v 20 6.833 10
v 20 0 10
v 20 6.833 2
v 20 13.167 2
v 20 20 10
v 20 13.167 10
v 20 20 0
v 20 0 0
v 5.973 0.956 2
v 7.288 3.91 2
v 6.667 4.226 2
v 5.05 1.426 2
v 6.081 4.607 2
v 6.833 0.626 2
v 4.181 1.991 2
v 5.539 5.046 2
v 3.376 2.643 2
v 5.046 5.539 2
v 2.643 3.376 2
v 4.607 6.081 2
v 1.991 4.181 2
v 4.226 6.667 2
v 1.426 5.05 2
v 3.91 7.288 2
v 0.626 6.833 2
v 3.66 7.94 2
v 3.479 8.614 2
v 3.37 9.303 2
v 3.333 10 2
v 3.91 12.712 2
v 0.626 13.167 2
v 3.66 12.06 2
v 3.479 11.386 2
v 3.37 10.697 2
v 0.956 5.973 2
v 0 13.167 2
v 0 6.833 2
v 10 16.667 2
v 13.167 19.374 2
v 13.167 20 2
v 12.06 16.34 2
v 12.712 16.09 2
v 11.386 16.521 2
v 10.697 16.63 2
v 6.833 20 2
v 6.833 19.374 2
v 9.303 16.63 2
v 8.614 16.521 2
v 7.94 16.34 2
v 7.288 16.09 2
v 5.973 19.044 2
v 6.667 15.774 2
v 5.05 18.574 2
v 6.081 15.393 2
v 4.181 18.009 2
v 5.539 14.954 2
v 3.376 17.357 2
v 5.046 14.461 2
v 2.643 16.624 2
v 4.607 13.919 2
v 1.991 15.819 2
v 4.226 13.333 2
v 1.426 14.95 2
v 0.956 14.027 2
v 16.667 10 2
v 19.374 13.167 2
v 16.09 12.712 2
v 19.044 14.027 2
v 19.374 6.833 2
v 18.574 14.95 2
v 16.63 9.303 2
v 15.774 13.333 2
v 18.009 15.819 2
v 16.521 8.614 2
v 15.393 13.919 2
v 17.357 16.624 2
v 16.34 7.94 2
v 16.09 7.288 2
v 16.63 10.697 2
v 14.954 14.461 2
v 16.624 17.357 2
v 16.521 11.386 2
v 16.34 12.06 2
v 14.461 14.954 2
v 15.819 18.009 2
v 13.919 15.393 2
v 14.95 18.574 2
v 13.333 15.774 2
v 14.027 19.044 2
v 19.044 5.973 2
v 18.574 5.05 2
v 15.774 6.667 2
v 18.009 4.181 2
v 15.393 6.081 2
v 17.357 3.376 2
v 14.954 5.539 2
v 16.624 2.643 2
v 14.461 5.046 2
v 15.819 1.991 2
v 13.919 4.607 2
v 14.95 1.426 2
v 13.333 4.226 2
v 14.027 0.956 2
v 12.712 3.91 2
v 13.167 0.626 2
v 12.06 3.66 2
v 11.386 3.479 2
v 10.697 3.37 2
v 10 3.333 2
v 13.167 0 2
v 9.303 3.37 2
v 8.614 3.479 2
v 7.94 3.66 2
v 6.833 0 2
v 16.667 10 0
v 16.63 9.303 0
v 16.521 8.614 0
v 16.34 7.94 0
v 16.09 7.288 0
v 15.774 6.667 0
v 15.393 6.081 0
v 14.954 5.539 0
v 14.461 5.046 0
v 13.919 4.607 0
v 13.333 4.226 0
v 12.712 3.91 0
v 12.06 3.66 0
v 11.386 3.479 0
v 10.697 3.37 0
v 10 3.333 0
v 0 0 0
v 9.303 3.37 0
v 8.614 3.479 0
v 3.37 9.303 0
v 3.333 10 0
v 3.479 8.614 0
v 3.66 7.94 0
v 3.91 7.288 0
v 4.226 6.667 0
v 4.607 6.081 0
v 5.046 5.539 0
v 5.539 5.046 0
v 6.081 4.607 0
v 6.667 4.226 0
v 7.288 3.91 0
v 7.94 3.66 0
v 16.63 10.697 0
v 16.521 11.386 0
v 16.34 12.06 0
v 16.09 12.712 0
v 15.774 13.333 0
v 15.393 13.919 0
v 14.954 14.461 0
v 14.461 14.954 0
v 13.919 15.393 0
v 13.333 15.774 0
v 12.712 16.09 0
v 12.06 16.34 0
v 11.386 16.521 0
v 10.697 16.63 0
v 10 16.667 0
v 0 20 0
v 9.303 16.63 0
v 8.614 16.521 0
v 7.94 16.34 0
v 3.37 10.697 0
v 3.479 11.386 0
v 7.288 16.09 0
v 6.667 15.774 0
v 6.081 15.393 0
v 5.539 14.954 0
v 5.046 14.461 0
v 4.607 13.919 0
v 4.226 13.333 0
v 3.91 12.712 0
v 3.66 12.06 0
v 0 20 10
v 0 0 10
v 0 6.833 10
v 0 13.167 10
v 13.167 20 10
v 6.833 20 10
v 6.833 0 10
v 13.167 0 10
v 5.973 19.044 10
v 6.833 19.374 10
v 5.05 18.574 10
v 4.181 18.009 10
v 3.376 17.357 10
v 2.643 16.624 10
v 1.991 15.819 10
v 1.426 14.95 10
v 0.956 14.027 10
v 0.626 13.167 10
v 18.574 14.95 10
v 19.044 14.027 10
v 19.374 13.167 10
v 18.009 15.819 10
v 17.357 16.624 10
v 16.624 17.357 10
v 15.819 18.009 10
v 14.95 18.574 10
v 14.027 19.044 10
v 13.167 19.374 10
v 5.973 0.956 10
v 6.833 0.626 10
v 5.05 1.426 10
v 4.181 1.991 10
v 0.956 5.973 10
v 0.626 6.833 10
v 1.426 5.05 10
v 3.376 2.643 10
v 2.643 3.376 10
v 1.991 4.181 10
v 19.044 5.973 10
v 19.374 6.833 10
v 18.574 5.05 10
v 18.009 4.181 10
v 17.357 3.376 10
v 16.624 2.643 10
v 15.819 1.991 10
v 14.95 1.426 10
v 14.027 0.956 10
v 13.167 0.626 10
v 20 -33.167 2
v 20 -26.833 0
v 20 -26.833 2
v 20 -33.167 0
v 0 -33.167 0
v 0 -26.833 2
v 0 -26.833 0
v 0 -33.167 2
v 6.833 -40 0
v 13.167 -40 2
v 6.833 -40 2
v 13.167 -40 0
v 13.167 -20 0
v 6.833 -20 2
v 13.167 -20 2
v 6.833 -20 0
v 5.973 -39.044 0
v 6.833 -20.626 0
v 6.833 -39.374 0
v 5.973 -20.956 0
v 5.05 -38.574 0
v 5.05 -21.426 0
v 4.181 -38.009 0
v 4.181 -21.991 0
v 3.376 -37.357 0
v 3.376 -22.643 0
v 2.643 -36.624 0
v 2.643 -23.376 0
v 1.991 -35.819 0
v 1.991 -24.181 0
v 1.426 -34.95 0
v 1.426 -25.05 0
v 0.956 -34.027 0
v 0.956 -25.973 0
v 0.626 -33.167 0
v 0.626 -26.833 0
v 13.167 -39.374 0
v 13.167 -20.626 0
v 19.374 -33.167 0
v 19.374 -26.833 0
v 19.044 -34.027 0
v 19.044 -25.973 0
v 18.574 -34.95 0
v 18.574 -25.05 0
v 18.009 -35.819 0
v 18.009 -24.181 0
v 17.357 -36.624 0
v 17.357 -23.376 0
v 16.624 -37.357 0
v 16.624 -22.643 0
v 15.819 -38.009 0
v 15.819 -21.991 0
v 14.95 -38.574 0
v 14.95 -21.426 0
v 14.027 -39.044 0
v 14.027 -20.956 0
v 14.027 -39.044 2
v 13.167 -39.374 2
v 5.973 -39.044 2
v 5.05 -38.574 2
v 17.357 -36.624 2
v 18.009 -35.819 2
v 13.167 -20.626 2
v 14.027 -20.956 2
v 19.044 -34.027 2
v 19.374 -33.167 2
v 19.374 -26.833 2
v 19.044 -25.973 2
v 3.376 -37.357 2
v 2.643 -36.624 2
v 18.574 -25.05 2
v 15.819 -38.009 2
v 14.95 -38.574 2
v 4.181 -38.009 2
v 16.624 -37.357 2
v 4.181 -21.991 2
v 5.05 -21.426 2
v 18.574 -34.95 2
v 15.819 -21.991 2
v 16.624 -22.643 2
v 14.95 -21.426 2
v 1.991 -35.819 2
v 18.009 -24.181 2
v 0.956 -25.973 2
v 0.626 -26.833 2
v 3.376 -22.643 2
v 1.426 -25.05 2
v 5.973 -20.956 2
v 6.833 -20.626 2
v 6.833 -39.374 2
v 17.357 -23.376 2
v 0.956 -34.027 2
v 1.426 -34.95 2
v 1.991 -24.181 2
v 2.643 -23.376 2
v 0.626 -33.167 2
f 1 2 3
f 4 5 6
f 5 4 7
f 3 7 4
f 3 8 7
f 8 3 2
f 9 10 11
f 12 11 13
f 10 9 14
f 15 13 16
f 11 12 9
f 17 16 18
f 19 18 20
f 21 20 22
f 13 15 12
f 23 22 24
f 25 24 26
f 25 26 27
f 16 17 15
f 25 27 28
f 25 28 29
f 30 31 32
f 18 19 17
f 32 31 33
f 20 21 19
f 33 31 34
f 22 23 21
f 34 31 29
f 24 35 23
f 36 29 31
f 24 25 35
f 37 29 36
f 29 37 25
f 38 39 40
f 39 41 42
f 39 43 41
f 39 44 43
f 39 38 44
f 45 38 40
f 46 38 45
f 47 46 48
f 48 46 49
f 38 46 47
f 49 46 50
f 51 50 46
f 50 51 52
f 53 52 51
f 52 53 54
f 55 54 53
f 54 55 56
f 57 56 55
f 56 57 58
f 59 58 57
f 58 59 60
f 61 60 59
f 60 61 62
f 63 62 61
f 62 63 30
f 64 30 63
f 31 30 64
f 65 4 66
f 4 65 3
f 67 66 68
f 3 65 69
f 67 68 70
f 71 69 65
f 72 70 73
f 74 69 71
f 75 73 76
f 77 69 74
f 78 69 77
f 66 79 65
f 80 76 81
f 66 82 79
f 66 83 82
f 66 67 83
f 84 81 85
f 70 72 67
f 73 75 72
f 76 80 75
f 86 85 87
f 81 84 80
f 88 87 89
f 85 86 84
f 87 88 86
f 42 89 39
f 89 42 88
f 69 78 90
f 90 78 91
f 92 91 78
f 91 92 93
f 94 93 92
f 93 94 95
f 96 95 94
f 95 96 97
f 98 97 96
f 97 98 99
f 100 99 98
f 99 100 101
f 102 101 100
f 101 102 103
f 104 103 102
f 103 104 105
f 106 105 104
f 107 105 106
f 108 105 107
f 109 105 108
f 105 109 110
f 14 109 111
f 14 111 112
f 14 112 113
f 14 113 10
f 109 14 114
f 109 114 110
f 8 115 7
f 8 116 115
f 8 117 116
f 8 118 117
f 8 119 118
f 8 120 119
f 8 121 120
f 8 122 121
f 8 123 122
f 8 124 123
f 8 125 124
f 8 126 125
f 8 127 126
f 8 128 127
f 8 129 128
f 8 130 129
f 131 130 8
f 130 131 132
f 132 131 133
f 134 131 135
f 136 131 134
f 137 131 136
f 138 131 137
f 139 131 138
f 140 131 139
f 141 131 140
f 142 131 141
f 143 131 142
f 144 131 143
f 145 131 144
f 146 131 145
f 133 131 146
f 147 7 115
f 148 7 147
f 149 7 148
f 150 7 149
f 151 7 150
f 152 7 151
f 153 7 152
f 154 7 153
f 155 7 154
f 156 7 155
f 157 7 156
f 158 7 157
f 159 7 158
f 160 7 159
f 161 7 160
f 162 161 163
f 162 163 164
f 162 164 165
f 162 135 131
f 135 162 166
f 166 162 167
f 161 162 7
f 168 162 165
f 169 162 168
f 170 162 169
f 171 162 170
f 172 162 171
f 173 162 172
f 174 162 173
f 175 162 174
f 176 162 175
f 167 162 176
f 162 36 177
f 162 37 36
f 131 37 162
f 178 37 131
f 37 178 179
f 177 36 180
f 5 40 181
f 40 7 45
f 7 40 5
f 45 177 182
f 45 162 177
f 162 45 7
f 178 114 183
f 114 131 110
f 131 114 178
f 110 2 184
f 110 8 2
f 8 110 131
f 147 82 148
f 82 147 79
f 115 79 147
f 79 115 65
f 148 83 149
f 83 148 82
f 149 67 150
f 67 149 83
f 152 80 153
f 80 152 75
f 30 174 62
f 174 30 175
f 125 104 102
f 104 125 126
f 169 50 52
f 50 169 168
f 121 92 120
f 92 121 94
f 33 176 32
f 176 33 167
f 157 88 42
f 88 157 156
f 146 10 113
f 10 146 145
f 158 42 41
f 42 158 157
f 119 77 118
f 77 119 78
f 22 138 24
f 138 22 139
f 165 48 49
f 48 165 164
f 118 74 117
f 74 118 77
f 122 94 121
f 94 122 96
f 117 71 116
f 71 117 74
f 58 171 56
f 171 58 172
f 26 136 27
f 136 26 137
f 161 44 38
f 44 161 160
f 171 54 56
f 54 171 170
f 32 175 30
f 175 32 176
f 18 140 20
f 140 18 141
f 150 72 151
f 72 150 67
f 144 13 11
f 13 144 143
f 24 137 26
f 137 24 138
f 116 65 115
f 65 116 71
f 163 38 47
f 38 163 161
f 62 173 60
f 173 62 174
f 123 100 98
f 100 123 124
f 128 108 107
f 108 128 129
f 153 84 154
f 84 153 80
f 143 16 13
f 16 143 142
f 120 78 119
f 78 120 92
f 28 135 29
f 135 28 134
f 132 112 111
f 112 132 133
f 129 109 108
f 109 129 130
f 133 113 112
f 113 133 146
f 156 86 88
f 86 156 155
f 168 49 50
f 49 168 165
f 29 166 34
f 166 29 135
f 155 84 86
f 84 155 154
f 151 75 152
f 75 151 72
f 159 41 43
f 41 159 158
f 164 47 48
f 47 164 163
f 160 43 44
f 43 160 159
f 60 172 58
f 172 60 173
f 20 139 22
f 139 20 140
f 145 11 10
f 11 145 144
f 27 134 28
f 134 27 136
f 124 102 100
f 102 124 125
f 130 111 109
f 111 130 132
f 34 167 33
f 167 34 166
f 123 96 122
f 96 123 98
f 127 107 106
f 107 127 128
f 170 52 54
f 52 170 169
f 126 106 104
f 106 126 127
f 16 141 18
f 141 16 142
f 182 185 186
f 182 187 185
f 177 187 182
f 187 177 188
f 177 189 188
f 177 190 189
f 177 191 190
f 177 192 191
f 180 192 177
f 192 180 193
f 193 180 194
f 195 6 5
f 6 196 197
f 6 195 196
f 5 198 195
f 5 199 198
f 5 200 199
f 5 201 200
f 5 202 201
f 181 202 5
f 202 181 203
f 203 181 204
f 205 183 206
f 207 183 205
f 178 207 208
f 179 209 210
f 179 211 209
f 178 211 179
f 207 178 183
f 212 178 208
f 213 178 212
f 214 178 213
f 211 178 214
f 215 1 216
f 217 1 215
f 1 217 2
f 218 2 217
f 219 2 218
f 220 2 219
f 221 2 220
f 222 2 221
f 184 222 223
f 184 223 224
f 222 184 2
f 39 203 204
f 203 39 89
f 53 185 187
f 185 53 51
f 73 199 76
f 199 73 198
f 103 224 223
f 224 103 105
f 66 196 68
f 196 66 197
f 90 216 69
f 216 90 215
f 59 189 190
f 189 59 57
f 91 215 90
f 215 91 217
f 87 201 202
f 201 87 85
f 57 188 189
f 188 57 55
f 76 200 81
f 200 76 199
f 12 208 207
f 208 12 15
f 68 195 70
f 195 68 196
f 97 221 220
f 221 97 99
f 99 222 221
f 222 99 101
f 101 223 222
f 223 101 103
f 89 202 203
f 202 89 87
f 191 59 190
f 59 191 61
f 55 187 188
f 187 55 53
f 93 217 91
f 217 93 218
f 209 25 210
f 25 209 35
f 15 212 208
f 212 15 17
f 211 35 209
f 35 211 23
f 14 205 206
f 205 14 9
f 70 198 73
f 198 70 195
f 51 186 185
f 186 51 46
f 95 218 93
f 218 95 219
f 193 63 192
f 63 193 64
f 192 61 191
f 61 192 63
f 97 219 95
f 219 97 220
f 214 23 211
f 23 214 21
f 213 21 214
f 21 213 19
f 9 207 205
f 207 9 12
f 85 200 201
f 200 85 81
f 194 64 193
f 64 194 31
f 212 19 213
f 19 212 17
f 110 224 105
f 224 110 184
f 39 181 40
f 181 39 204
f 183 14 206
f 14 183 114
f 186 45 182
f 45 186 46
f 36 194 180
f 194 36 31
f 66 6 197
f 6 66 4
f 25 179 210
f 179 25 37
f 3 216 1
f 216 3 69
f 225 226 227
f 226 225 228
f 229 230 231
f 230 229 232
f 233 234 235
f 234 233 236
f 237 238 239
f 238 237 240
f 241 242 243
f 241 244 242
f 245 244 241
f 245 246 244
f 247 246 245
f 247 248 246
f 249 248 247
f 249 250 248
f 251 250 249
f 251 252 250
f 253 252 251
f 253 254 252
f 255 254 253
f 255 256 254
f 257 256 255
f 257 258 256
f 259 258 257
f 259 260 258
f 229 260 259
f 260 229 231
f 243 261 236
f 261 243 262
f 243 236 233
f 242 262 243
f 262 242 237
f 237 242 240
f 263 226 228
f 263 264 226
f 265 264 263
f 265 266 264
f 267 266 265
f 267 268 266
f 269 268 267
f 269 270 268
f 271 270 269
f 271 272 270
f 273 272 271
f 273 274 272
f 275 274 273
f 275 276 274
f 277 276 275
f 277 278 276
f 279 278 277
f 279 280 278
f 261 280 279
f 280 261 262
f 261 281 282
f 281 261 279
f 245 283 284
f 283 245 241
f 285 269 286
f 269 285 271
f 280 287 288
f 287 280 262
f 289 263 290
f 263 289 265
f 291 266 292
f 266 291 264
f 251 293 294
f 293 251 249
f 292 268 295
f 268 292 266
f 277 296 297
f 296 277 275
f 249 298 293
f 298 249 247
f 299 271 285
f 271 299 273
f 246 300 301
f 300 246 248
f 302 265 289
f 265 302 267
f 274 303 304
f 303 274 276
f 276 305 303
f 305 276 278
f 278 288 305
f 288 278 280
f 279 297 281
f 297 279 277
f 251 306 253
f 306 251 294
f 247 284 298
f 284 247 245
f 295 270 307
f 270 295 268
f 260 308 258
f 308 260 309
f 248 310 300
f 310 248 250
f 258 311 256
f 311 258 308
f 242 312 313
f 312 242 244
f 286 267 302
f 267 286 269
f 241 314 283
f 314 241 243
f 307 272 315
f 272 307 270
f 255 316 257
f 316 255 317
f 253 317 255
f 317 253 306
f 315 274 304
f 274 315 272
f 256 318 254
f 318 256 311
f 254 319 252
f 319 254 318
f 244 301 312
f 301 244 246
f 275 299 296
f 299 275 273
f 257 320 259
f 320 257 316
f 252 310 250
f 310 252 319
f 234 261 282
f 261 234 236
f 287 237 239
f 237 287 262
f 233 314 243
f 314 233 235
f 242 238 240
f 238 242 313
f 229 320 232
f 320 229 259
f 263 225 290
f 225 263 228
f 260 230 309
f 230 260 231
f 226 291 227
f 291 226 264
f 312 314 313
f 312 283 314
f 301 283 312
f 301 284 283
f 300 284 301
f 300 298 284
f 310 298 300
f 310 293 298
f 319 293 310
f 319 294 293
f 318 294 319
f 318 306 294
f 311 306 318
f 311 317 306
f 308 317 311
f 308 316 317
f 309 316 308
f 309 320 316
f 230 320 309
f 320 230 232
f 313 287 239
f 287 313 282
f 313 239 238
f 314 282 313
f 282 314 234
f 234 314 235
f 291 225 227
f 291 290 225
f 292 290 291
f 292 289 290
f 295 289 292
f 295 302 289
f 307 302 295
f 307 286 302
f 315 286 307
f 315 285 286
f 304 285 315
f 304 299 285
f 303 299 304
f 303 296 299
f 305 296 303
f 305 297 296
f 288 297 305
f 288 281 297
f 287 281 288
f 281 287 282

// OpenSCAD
//==================================================
// MultiShape Token Holder by @satanin
//==================================================
// Choose the shape of your tokens
token_sides=60; // [3:Triangle, 4:Square, 5:Pentagon, 6:Hexagon, 60:Circular]
// Diameter of your token
token_diameter=19;
// Height of the token holder
piece_height=10;
// Thickness of the base
base_thickness=2;
// How many?
token_organizers=1;
print_cover="yes";//["yes":Yes, "no":No]

/* Hidden */
// Do not edit beyond this point unless 
// you know what you´re doing.
//---------------------------------
// Spacer to give tokens some extra space
token_spacer=1;
token_radius=token_diameter/2+token_spacer/2;
structure_spacer=1;
structure_diameter=token_diameter+structure_spacer;
structure_height=piece_height-base_thickness;

module base(){
	difference(){
		cube([structure_diameter,structure_diameter,base_thickness]);
		translate([token_radius,token_radius,0]){
			cylinder(base_thickness*3,structure_diameter/3,structure_diameter/3, center= true, $fn=60);
		}
	}
}

module body(){
	base();
  difference(){
    difference(){
      translate([0,0,base_thickness]){cube([structure_diameter, structure_diameter, structure_height]);}
      translate([token_radius, token_radius, 0]){cylinder(structure_height*3, token_radius-0.1, token_radius-0.1, center=true, $fn=token_sides);}
    }

    translate([structure_diameter/2-token_diameter/6,-structure_diameter*3,base_thickness]){cube([token_diameter/3,token_diameter*5,structure_height*2]);}
    translate([-structure_diameter*3,structure_diameter/2-token_diameter/6,base_thickness]){cube([token_diameter*5,token_diameter/3,structure_height*2]);}
  }
}

module cover(){
	if(print_cover=="yes"){
		cover_thickness=base_thickness;
		translate([0,-structure_diameter,piece_height]){
			rotate([180,0,0]){
				difference(){
					translate([0,0,piece_height-cover_thickness]){
						color("indigo"){
							cube([structure_diameter,structure_diameter,cover_thickness]);
						}
					}
					body();
				}
			}
		}
	}
}

for(i=[0:1:token_organizers-1]){	
	translate([structure_diameter*i, 0, 0]){
		body();
	}
	translate([(structure_diameter+1)*i,0,0]){
		cover();
	}
}
